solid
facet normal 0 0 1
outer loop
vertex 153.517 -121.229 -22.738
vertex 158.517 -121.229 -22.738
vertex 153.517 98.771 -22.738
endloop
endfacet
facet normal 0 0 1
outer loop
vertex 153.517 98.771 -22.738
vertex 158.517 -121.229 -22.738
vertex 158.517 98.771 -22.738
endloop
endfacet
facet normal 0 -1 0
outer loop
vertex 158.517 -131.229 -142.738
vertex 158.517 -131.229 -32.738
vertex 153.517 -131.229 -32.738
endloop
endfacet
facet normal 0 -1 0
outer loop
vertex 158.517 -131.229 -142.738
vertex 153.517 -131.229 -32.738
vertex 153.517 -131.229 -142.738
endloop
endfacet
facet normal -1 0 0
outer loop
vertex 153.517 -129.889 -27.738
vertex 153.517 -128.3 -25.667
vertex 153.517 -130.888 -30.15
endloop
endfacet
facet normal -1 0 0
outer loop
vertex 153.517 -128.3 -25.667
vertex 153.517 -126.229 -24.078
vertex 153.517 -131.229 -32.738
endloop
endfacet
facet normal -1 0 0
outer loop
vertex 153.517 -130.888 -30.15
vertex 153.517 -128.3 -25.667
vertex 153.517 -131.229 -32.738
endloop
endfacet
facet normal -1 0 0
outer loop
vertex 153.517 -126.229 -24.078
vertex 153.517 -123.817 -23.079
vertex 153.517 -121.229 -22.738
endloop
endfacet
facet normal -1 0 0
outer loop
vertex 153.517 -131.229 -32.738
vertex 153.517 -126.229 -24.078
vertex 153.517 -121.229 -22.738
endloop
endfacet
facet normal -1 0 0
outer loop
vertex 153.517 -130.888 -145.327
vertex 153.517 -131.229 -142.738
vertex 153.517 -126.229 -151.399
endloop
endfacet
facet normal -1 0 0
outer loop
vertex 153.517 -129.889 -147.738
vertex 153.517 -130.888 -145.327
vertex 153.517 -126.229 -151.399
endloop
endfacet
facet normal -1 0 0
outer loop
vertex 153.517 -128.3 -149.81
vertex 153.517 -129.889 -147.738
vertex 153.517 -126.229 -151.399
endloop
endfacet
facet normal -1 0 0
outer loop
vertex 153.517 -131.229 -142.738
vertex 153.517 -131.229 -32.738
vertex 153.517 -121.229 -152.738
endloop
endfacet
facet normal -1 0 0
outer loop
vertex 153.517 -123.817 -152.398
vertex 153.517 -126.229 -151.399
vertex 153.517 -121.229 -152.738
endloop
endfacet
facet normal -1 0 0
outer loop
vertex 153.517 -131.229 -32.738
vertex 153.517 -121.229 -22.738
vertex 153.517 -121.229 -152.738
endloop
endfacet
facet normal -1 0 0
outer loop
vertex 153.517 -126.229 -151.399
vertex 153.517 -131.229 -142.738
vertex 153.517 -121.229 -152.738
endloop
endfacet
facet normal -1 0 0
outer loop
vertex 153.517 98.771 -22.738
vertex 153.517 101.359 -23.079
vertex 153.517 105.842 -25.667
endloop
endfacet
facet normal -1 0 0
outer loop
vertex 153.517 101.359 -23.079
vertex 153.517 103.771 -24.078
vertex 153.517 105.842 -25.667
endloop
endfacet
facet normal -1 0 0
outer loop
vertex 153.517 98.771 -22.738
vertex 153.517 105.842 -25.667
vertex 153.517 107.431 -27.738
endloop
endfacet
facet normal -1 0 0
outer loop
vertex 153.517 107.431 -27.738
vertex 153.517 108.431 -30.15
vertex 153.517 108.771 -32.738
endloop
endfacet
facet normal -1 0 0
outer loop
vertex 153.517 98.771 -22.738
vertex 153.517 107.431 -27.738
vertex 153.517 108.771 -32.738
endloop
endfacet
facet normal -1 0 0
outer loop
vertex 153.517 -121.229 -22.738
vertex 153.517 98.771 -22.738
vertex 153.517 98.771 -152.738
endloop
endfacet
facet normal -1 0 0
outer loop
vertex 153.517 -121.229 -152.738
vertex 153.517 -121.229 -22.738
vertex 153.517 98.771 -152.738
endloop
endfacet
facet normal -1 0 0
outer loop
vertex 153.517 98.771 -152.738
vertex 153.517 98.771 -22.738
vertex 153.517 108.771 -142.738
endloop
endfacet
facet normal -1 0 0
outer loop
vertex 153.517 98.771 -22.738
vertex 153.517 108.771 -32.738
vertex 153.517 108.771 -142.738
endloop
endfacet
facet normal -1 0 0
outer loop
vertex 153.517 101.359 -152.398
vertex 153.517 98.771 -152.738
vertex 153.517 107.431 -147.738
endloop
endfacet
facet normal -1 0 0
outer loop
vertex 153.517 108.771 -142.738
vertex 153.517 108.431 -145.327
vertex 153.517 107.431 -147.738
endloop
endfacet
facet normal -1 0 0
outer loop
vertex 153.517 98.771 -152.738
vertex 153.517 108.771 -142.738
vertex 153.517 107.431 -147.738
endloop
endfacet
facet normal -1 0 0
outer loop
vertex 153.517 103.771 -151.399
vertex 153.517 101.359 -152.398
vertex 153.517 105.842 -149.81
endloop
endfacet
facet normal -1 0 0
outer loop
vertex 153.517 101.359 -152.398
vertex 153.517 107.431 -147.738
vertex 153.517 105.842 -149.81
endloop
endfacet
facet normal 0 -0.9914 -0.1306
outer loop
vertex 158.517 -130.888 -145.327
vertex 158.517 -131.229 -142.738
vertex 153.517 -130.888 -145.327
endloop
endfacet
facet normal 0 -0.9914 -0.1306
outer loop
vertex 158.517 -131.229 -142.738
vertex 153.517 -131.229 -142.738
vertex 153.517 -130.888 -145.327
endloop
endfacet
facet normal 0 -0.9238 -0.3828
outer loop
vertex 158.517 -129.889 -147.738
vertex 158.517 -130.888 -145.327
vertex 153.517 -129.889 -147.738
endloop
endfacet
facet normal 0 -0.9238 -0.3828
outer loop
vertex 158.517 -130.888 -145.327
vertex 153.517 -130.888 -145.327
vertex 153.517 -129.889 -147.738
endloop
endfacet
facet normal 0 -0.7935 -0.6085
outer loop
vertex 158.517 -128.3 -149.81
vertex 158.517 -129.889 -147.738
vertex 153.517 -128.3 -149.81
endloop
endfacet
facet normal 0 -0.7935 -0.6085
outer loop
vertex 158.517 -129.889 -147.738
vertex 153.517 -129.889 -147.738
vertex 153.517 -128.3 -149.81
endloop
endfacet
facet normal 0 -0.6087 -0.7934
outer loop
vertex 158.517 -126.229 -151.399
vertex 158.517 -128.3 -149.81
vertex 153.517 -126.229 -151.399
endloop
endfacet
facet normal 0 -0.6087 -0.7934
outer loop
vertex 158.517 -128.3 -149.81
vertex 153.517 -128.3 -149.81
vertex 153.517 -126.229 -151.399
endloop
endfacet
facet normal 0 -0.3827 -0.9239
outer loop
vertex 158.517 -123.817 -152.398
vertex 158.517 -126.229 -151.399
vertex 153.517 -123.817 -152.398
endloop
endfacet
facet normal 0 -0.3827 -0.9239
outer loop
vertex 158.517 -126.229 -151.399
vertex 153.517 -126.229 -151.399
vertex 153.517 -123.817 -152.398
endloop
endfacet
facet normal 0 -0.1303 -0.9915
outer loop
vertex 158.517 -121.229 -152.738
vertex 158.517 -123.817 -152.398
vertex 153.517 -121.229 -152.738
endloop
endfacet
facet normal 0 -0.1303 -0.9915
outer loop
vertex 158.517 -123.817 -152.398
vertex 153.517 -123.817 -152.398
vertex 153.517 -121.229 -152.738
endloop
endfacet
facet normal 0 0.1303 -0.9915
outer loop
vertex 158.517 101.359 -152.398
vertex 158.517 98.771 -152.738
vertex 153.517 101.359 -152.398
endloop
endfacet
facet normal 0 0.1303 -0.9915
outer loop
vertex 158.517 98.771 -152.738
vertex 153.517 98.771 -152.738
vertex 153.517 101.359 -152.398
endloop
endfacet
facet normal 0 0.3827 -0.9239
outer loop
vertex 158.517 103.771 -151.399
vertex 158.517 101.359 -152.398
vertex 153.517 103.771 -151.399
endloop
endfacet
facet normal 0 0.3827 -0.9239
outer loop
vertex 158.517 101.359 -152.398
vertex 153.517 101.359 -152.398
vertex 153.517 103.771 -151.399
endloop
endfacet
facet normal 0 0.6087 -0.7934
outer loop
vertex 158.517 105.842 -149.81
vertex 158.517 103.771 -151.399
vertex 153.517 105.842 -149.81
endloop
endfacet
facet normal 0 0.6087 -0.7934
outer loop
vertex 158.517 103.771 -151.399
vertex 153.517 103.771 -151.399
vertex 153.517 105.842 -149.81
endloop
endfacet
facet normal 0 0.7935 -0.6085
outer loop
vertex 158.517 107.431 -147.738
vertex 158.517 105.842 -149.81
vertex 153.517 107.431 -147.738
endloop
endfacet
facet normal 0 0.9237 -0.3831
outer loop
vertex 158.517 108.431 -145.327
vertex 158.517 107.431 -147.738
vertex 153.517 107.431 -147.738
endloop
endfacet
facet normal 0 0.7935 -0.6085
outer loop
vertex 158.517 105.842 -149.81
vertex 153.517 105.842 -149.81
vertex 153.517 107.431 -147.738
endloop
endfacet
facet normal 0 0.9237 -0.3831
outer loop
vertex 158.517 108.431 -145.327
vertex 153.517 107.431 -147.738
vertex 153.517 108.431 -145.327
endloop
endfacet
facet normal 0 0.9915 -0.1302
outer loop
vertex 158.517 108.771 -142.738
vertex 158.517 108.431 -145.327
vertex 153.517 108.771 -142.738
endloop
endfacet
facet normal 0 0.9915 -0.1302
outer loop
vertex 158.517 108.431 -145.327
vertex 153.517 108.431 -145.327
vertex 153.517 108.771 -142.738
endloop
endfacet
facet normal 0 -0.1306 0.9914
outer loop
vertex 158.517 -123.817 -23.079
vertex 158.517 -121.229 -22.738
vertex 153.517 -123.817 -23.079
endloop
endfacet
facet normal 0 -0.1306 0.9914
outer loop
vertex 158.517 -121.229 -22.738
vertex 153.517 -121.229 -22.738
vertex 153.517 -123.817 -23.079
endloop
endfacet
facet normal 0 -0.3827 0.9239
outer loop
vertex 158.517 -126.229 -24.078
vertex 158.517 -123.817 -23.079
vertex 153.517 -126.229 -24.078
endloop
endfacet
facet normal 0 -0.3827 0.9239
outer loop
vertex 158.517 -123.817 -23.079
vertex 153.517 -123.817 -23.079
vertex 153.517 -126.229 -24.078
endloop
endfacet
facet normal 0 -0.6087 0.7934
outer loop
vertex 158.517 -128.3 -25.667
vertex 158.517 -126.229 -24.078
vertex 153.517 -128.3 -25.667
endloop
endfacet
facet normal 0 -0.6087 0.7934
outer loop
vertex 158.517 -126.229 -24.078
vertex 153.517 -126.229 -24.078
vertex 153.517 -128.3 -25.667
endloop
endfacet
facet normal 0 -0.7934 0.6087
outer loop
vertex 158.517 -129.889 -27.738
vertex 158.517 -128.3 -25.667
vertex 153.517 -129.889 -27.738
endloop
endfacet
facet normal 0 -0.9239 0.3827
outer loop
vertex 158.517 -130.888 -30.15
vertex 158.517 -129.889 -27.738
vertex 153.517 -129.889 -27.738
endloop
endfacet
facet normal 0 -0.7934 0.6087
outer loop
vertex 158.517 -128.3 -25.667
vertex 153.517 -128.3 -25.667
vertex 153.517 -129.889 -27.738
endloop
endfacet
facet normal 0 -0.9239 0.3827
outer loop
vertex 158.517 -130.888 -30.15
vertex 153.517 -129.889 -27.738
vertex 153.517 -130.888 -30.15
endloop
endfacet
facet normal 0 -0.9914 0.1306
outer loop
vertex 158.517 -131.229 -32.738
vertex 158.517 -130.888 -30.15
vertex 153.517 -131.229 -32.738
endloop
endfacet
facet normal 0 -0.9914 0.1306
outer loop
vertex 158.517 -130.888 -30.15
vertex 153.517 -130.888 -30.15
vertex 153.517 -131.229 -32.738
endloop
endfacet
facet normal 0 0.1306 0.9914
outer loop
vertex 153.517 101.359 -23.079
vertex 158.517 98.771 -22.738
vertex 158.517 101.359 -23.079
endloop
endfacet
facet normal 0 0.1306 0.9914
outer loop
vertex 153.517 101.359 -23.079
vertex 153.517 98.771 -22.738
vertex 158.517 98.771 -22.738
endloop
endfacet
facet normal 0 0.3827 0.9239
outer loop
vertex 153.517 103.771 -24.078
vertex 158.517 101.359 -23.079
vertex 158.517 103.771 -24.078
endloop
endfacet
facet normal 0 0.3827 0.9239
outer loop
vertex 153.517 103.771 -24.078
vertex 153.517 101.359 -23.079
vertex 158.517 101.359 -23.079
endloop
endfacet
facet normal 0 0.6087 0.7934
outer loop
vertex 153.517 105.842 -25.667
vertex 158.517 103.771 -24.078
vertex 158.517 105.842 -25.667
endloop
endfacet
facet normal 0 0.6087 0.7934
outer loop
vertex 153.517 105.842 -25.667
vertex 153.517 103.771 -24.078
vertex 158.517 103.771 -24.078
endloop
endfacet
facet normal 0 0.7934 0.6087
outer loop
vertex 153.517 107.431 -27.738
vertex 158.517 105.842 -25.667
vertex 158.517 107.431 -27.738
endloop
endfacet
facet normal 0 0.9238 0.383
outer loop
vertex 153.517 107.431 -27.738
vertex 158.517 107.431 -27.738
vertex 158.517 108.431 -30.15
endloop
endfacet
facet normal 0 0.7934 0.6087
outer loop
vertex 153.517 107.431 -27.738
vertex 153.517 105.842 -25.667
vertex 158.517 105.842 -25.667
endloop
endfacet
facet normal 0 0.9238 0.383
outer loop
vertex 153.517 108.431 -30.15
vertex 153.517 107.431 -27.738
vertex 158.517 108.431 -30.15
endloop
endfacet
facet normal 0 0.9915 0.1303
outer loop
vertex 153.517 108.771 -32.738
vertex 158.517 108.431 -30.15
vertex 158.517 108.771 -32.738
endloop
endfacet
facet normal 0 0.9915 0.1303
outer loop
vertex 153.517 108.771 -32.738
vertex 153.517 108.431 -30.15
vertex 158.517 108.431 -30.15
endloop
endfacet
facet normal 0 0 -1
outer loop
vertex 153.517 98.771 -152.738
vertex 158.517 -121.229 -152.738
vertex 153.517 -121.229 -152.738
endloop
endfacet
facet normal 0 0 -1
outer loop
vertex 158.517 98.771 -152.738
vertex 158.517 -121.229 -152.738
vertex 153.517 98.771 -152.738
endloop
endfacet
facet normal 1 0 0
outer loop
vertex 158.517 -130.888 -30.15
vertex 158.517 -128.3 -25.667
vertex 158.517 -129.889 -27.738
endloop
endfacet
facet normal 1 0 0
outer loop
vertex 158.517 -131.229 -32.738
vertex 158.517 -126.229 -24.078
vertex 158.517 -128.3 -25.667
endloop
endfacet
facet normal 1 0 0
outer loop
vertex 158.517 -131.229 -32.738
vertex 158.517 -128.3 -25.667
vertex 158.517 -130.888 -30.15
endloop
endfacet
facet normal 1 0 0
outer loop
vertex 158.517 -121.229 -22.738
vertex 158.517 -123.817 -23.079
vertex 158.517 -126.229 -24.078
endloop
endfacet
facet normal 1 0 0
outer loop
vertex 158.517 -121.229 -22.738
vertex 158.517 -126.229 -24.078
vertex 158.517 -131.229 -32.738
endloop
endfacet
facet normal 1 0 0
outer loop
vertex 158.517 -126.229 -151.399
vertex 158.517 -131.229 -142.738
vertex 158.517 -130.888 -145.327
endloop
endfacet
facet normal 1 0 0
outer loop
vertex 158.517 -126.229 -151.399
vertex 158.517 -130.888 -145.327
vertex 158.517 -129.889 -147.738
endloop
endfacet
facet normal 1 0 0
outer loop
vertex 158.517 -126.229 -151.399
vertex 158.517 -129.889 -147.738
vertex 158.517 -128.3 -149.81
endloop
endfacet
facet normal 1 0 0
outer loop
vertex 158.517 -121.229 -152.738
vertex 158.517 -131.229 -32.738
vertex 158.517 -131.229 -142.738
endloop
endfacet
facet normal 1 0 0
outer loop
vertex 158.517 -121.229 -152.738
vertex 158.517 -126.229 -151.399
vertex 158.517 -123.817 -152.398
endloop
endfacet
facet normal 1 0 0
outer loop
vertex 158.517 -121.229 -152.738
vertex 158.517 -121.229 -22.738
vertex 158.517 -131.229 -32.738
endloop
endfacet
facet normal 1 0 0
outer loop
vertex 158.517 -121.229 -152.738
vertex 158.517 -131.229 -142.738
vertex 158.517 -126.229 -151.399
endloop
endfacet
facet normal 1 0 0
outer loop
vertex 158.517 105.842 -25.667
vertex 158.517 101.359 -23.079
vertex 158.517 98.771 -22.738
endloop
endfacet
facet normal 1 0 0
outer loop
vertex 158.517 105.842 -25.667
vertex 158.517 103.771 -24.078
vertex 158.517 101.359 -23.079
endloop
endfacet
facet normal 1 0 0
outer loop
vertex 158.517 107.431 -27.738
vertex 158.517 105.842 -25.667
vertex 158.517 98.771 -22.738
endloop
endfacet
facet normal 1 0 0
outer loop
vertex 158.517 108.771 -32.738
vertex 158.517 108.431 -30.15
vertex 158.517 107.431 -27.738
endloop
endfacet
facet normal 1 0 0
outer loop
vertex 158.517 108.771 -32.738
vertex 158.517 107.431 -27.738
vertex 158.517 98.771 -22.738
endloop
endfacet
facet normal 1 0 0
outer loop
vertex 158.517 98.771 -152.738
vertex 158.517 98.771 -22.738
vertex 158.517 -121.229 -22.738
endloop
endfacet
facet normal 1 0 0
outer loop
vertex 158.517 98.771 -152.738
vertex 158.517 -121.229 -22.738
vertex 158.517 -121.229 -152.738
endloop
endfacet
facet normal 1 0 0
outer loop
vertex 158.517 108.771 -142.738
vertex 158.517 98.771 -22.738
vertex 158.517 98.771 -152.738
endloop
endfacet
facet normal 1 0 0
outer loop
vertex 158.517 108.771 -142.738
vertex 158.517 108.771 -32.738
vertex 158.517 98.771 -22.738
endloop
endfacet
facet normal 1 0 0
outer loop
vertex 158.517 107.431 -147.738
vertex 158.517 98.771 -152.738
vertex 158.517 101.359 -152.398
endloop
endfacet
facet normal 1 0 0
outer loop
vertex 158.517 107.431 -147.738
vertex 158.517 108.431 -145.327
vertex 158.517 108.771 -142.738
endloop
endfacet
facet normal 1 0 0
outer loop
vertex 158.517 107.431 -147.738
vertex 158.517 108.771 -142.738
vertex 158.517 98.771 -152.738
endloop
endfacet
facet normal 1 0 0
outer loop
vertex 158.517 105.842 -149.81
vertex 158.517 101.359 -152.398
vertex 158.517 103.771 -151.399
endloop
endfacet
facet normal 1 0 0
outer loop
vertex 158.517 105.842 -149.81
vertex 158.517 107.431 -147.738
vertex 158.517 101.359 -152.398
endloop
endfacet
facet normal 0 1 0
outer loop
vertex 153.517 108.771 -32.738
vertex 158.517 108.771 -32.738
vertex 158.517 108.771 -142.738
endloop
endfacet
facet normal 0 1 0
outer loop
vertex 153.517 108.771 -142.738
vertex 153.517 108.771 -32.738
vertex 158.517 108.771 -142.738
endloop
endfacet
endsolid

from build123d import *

# Parameters (mm, degrees)
SKETCH1_W           = 130
SKETCH1_H           = 240
BOSS_EXTRUDE1_DEPTH = 5
FILLET1_R           = 10


with BuildPart() as part:
    # Sketch1 → Boss-Extrude1 (new body)
    with BuildSketch(Plane(origin=(158.517331673, 0, 0), x_dir=(0, 0, -1), z_dir=(1, 0, 0))):
        with Locations((87.738499674, -11.228757924)):
            Rectangle(SKETCH1_W, SKETCH1_H)
    extrude(amount=-BOSS_EXTRUDE1_DEPTH)

    # Fillet1
    fillet1_edges = [part.edges().sort_by_distance(p)[0] for p in [
        (156.017331673, -131.228757924, -152.738499674),
        (156.017331673, -131.228757924, -22.738499674),
        (156.017331673, 108.771242076, -22.738499674),
        (156.017331673, 108.771242076, -152.738499674),
    ]]
    fillet(fillet1_edges, radius=FILLET1_R)


solid = part.part
